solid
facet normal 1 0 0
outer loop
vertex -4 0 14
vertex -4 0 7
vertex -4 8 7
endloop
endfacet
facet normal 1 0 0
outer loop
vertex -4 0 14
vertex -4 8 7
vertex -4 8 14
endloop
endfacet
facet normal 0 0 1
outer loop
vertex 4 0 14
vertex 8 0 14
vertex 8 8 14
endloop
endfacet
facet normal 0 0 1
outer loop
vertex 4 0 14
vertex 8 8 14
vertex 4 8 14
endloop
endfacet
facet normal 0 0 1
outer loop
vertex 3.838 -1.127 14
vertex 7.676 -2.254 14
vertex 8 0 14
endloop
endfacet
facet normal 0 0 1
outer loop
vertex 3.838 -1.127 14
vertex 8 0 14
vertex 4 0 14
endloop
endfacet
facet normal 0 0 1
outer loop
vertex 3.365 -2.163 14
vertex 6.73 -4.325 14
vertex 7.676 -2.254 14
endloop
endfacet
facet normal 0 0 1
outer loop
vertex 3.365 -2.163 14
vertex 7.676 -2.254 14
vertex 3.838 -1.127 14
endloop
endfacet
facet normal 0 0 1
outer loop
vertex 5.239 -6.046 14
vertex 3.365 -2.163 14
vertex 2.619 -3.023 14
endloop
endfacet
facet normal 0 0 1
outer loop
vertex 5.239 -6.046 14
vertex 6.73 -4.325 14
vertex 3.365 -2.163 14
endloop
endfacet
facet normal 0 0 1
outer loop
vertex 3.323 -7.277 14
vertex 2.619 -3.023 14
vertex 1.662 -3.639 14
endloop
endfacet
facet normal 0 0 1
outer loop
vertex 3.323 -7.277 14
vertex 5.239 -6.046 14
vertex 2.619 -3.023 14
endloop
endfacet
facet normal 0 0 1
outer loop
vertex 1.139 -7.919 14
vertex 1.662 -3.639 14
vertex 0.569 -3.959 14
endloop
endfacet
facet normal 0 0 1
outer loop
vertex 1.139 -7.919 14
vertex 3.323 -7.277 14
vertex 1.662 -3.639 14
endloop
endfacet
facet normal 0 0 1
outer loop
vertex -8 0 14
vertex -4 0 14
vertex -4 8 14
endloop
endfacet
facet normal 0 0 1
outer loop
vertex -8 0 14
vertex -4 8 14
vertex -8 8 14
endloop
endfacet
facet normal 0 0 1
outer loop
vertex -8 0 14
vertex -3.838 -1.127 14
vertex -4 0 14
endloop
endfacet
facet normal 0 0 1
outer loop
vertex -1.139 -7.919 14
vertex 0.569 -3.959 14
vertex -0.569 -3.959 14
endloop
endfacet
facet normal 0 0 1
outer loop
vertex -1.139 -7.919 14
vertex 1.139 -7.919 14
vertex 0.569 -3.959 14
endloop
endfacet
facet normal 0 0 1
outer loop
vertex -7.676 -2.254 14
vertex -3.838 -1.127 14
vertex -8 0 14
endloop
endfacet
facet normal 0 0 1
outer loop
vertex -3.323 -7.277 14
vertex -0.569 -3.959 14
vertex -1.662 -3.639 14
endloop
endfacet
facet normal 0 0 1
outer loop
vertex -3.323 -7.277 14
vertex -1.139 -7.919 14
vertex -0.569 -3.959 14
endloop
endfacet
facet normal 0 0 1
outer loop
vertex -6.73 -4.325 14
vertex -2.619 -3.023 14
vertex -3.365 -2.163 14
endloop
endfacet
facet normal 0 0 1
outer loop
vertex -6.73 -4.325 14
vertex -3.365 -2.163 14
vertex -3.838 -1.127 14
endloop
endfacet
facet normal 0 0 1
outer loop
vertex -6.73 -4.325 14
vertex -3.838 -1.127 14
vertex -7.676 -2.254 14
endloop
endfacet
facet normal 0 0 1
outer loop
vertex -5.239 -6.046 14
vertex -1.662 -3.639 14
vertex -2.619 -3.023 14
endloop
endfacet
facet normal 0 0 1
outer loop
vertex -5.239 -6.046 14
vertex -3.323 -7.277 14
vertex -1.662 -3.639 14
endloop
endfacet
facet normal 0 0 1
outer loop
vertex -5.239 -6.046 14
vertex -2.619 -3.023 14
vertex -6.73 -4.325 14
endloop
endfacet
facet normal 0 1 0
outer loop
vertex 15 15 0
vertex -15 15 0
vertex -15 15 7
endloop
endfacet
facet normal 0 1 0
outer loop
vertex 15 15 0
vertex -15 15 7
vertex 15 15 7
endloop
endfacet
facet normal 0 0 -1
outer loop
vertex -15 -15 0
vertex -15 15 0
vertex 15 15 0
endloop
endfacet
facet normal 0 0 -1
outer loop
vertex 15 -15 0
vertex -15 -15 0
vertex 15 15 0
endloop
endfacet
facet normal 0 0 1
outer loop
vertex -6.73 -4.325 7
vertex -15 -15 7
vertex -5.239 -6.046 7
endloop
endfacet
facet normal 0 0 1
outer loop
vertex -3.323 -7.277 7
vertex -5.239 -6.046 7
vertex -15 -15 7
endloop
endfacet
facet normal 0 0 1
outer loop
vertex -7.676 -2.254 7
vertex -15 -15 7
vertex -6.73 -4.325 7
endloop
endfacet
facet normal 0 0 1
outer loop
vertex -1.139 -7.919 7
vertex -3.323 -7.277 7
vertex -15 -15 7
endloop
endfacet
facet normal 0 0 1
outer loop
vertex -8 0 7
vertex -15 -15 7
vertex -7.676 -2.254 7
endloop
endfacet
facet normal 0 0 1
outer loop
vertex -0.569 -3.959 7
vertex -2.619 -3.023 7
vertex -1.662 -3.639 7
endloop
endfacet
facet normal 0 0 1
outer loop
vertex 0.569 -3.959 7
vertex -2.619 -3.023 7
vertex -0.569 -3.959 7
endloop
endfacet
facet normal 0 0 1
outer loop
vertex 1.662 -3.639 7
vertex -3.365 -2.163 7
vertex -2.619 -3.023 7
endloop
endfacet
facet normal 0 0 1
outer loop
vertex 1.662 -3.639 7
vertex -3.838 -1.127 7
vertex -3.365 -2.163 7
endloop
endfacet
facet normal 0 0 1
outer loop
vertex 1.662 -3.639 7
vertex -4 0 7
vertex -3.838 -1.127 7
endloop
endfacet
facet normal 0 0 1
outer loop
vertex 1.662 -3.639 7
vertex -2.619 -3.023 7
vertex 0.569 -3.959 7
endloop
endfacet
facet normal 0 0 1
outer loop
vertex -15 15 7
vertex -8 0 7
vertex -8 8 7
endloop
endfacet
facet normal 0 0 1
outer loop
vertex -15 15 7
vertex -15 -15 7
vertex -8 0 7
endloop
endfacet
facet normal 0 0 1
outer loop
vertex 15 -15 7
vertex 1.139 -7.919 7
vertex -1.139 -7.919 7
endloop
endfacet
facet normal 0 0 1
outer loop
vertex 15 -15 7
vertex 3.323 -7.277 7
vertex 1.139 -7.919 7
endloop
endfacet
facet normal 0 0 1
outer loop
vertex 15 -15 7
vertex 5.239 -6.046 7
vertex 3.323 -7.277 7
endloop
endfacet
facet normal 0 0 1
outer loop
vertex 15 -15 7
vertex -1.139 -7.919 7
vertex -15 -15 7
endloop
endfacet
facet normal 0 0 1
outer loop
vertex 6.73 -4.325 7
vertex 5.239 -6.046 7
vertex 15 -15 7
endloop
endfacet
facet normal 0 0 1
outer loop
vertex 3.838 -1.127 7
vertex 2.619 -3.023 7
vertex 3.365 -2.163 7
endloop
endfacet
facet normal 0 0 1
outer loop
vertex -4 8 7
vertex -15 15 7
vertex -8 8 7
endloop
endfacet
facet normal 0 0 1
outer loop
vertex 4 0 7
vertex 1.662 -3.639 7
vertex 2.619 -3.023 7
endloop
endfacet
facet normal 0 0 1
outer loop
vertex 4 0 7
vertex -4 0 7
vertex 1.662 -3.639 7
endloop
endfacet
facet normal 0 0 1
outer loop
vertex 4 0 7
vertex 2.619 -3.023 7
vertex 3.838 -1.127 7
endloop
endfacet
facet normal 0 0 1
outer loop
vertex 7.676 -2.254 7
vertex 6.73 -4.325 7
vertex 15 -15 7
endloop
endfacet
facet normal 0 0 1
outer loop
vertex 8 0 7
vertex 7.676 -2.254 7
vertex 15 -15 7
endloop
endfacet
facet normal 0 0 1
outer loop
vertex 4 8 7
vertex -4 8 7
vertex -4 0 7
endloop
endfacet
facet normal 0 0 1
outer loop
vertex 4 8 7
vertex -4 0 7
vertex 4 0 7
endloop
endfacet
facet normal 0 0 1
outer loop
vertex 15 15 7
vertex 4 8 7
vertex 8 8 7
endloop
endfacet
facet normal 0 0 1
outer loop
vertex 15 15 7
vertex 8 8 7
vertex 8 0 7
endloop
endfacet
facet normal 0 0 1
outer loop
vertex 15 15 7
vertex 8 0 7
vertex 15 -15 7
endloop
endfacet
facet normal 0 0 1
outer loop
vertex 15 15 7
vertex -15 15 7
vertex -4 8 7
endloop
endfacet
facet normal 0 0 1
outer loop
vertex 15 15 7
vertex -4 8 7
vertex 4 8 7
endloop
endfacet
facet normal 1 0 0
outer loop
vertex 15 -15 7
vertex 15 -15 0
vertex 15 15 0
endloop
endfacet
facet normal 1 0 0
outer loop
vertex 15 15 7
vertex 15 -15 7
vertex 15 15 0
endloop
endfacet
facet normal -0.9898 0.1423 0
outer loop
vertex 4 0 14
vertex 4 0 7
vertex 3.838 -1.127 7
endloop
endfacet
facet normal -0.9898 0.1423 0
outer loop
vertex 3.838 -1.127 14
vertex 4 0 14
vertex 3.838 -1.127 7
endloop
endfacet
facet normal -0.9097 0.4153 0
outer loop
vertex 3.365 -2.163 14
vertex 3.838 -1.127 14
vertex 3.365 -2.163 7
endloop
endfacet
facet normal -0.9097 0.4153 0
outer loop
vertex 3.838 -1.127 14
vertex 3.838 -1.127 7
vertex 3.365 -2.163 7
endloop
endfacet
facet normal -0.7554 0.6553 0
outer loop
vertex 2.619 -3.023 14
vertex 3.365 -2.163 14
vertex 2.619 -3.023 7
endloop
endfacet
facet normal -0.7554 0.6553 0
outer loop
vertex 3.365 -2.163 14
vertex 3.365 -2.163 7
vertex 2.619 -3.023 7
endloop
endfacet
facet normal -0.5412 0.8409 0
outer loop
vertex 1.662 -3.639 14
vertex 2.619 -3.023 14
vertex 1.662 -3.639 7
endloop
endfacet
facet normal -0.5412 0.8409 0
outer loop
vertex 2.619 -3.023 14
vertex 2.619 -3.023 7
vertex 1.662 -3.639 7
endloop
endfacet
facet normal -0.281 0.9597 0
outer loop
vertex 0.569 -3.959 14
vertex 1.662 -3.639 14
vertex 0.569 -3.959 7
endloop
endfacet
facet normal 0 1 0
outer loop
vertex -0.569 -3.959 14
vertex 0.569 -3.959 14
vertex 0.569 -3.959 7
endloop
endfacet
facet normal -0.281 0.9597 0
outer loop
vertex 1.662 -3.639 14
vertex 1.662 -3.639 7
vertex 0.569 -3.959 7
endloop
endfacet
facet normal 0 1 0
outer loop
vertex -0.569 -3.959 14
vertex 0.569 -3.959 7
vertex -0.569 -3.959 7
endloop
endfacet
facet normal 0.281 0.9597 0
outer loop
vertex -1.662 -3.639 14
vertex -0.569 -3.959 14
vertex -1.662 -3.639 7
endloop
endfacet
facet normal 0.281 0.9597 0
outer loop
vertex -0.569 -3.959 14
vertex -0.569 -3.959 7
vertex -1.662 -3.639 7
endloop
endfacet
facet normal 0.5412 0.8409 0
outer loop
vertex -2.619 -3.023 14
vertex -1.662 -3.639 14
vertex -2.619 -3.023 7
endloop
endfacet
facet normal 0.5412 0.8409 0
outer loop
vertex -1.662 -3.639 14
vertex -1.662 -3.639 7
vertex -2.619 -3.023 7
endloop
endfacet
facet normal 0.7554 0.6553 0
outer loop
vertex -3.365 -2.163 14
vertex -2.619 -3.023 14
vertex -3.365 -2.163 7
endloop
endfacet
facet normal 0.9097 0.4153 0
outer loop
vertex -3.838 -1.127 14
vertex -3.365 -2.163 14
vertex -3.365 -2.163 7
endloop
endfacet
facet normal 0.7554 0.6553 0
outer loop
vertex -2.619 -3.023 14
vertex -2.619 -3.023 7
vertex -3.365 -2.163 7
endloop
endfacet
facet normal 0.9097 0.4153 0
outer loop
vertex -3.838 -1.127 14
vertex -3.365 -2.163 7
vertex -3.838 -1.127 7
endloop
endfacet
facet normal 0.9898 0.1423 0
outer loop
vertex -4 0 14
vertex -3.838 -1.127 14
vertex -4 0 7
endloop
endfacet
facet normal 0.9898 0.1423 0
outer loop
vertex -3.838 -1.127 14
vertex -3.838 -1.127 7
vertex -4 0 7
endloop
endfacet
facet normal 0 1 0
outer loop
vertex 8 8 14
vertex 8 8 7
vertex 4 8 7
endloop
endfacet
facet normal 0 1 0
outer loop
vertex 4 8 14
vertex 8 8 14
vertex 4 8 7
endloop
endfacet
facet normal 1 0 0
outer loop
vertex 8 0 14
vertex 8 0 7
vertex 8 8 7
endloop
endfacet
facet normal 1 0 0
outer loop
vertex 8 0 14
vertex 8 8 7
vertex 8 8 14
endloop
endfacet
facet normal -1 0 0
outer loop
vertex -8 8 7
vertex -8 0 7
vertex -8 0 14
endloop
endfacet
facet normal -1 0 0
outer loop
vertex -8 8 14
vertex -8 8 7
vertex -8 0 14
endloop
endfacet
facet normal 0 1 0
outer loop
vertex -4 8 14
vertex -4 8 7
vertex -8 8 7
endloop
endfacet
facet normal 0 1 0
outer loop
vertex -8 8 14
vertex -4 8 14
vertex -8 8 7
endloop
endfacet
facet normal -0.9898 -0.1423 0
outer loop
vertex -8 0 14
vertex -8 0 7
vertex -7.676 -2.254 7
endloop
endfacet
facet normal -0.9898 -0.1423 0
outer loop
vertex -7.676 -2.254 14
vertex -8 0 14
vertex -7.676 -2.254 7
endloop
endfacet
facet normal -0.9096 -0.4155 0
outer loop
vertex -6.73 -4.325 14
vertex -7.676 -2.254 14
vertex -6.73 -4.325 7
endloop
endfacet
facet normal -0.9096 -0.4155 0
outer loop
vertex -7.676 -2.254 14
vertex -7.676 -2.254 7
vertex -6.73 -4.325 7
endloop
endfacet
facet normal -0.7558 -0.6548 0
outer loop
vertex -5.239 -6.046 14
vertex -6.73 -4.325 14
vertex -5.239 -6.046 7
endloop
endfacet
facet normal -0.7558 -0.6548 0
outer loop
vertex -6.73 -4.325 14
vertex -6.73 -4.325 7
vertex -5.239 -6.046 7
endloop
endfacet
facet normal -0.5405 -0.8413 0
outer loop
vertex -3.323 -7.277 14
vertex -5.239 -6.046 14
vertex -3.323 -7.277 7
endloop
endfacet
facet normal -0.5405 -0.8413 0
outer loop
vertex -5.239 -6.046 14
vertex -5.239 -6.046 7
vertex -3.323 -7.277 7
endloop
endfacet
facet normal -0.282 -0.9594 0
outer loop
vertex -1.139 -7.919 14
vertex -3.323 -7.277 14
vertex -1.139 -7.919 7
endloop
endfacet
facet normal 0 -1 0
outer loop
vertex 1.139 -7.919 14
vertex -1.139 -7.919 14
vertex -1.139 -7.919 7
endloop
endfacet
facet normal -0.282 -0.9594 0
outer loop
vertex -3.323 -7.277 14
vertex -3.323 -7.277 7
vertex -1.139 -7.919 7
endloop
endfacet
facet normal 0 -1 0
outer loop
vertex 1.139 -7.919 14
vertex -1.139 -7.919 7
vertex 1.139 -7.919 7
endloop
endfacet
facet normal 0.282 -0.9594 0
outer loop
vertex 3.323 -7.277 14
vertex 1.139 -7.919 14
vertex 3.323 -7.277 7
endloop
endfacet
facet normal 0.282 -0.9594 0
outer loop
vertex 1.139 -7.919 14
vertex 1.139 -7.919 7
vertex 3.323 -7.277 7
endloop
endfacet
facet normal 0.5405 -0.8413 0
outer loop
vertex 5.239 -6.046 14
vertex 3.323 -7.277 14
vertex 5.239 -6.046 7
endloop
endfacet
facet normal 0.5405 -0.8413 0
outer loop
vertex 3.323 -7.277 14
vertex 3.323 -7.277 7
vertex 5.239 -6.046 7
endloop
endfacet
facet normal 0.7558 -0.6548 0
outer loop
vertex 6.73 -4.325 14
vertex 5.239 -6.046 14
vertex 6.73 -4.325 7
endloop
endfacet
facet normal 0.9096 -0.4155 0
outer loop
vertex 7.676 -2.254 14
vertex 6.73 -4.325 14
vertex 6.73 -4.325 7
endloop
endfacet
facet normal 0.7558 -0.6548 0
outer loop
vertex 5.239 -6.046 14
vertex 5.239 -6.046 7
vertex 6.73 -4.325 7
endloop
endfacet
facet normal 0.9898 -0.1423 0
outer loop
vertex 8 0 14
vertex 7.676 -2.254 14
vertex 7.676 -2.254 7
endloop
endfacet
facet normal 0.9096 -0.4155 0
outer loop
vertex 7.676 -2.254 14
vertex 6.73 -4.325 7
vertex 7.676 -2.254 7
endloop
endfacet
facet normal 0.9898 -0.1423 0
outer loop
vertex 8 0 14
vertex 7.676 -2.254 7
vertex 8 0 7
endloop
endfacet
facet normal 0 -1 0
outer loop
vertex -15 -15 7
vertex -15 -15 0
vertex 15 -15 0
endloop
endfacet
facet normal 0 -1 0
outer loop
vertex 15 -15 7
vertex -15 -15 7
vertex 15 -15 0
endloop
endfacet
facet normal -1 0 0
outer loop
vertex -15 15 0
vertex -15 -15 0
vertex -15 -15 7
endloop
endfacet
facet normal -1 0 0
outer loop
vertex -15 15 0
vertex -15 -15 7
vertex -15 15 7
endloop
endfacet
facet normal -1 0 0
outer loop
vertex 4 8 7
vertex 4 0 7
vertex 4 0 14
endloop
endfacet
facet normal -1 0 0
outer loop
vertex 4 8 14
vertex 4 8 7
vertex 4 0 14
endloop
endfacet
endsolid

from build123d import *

# Parameters (mm, degrees)
F0_W      = 30
F0_H      = 30
F1_DEPTH  = 7
F3_DEPTH  = 7
F3_FACE_W = 4
F3_FACE_H = 7
F4_DEPTH  = 8


with BuildPart() as f1:
    # F0 (on Top) → F1 (new body)
    with BuildSketch(Plane.XY):
        Rectangle(F0_W, F0_H)
    extrude(amount=F1_DEPTH)

    # F2 (on face) → F3 (join)
    with BuildSketch(Plane.XY.offset(7)):
        with BuildLine():
            ThreePointArc((4, 0), (0, -4), (-4, 0))
            Line((-4, 0), (-8, 0))
            ThreePointArc((-8, 0), (0, -8), (8, 0))
            Line((8, 0), (4, 0))
        make_face()
    extrude(amount=F3_DEPTH)

    # F3_face (on face) → F4 (join)
    with BuildSketch(Plane(origin=(-6, 0, 10.5), x_dir=(-1, 0, 0), z_dir=(0, 1, 0))):
        Rectangle(F3_FACE_W, F3_FACE_H)
        with Locations((-12, 0)):
            Rectangle(F3_FACE_W, F3_FACE_H)
    extrude(amount=F4_DEPTH)


solid = f1.part
